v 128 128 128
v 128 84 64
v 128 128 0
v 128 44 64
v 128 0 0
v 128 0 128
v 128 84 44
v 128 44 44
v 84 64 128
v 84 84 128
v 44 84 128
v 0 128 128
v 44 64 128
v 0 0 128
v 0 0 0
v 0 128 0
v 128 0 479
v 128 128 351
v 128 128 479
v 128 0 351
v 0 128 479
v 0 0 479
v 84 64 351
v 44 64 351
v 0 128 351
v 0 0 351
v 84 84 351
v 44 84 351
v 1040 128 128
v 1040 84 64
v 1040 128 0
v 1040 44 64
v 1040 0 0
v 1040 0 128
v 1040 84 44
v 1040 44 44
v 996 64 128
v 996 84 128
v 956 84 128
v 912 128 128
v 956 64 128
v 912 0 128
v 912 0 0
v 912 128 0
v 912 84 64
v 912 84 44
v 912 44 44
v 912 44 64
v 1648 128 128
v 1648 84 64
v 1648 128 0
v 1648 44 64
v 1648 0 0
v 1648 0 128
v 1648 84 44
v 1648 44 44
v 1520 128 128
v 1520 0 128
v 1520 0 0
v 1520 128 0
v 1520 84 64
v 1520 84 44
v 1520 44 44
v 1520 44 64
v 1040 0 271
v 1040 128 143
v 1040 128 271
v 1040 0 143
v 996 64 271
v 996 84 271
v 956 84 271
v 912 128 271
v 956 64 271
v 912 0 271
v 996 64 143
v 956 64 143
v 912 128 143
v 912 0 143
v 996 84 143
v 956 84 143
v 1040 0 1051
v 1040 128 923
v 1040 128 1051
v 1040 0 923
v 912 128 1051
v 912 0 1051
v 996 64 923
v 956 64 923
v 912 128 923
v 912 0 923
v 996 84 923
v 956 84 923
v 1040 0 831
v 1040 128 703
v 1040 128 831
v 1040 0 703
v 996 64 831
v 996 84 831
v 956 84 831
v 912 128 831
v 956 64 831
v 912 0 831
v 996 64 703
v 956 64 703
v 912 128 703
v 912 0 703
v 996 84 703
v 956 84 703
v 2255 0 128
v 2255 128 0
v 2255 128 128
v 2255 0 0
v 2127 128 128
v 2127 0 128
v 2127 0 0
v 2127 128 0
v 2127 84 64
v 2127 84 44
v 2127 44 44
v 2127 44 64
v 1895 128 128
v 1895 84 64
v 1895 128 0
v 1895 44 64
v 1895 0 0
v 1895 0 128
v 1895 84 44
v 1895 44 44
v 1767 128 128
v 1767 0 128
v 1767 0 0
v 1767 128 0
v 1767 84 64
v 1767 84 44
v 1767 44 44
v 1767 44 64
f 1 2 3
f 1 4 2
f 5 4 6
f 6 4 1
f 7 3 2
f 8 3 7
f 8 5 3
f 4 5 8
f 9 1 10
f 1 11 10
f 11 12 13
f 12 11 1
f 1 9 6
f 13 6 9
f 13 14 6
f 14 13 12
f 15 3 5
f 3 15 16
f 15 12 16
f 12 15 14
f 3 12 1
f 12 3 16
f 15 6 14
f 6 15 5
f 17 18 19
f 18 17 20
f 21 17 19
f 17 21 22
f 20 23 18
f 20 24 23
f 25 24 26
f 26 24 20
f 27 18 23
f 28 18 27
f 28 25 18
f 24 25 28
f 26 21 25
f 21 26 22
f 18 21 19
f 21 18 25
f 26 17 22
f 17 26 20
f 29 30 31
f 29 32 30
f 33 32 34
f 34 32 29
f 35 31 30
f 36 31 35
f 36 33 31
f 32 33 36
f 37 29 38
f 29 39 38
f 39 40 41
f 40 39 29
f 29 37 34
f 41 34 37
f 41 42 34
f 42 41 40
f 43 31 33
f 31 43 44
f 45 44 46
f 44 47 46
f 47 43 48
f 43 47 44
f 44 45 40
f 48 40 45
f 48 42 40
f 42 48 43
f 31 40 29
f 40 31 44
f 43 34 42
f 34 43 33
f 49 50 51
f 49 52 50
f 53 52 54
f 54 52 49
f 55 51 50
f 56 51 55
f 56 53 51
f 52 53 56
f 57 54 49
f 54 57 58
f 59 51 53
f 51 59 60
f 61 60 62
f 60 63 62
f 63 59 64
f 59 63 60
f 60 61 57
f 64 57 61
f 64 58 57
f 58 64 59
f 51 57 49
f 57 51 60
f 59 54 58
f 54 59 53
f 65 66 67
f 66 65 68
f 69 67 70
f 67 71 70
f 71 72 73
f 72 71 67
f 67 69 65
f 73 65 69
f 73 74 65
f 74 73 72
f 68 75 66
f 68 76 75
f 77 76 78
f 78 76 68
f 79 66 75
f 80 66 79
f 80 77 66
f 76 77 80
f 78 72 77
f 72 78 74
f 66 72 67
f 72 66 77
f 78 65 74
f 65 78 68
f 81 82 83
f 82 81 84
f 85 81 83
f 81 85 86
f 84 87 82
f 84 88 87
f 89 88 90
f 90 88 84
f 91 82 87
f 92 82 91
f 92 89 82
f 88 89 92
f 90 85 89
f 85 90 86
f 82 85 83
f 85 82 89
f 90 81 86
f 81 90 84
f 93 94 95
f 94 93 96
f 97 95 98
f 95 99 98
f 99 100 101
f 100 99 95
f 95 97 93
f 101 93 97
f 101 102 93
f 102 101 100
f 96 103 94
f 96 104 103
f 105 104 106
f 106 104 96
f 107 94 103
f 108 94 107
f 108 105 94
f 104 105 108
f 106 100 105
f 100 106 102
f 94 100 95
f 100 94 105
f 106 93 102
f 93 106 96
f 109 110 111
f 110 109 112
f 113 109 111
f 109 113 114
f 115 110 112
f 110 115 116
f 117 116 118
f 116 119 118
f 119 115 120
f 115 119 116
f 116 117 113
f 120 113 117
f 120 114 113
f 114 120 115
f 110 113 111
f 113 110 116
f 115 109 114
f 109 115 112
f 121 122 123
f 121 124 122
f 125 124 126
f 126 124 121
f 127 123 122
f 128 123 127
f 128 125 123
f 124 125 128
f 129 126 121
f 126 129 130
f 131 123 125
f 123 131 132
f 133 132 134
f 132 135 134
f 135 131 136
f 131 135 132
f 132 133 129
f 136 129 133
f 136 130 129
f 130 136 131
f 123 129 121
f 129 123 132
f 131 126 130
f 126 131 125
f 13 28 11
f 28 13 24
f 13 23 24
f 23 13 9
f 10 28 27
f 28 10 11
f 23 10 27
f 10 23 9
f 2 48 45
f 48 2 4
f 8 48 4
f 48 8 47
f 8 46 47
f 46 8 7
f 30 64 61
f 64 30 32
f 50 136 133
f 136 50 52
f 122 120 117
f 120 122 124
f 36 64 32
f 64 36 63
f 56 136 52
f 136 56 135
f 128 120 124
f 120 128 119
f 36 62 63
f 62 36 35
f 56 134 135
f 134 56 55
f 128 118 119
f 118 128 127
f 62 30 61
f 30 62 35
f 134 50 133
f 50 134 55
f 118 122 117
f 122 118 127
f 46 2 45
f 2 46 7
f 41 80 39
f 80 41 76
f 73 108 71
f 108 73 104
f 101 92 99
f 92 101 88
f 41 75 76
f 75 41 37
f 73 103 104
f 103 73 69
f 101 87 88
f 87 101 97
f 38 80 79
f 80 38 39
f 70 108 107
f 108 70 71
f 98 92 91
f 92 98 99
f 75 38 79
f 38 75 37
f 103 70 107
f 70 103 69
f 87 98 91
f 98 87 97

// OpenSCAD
union() {
	%cube(size = [2560, 1600, 1000]);
	translate(v = [0.0, 0.0, 0.0]) {
		cube(size = [128, 128, 128]);
	}
	translate(v = [0.0, 0.0, 351.0]) {
		cube(size = [128, 128, 128]);
	}
	translate(v = [0.0, 0.0, 0.0]) {
		cube(size = [128, 128, 128]);
	}
	translate(v = [912.0, 0.0, 0.0]) {
		cube(size = [128, 128, 128]);
	}
	translate(v = [912.0, 0.0, 0.0]) {
		cube(size = [128, 128, 128]);
	}
	translate(v = [1520.0, 0.0, 0.0]) {
		cube(size = [128, 128, 128]);
	}
	translate(v = [912.0, 0.0, 0.0]) {
		cube(size = [128, 128, 128]);
	}
	translate(v = [912.0, 0.0, 0.0]) {
		cube(size = [128, 128, 128]);
	}
	translate(v = [0.0, 0.0, 0.0]) {
		cube(size = [128, 128, 128]);
	}
	translate(v = [0.0, 0.0, 0.0]) {
		cube(size = [128, 128, 128]);
	}
	translate(v = [912.0, 0.0, 0.0]) {
		cube(size = [128, 128, 128]);
	}
	translate(v = [912.0, 0.0, 0.0]) {
		cube(size = [128, 128, 128]);
	}
	translate(v = [912.0, 0.0, 143.0]) {
		cube(size = [128, 128, 128]);
	}
	translate(v = [912.0, 0.0, 0.0]) {
		cube(size = [128, 128, 128]);
	}
	translate(v = [912.0, 0.0, 923.0]) {
		cube(size = [128, 128, 128]);
	}
	translate(v = [912.0, 0.0, 0.0]) {
		cube(size = [128, 128, 128]);
	}
	translate(v = [912.0, 0.0, 703.0]) {
		cube(size = [128, 128, 128]);
	}
	translate(v = [912.0, 0.0, 0.0]) {
		cube(size = [128, 128, 128]);
	}
	translate(v = [912.0, 0.0, 0.0]) {
		cube(size = [128, 128, 128]);
	}
	translate(v = [912.0, 0.0, 0.0]) {
		cube(size = [128, 128, 128]);
	}
	translate(v = [2127.0, 0.0, 0.0]) {
		cube(size = [128, 128, 128]);
	}
	translate(v = [1767.0, 0.0, 0.0]) {
		cube(size = [128, 128, 128]);
	}
	translate(v = [912.0, 0.0, 0.0]) {
		cube(size = [128, 128, 128]);
	}
	translate(v = [912.0, 0.0, 0.0]) {
		cube(size = [128, 128, 128]);
	}
	translate(v = [912.0, 0.0, 0.0]) {
		cube(size = [128, 128, 128]);
	}
	translate(v = [912.0, 0.0, 0.0]) {
		cube(size = [128, 128, 128]);
	}
	translate(v = [912.0, 0.0, 0.0]) {
		cube(size = [128, 128, 128]);
	}
	translate(v = [912.0, 0.0, 0.0]) {
		cube(size = [128, 128, 128]);
	}
	translate(v = [912.0, 0.0, 0.0]) {
		cube(size = [128, 128, 128]);
	}
	translate(v = [912.0, 0.0, 0.0]) {
		cube(size = [128, 128, 128]);
	}
	translate(v = [0.0, 0.0, 0.0]) {
		cube(size = [128, 128, 128]);
	}
	translate(v = [0.0, 0.0, 0.0]) {
		cube(size = [128, 128, 128]);
	}
	translate(v = [64.0, 64.0, 415.0]) {
		rotate(a = [0, 180.0, 0.0]) {
			cube(size = [20, 20, 351.0]);
		}
	}
	translate(v = [64.0, 64.0, 64.0]) {
		rotate(a = [0, 0.0, 0.0]) {
			cube(size = [20, 20, 351.0]);
		}
	}
	translate(v = [976.0, 64.0, 64.0]) {
		rotate(a = [0, 90.0, 180.0]) {
			cube(size = [20, 20, 912.0]);
		}
	}
	translate(v = [976.0, 64.0, 64.0]) {
		rotate(a = [0, 90.0, 0.0]) {
			cube(size = [20, 20, 0.0]);
		}
	}
	translate(v = [1584.0, 64.0, 64.0]) {
		rotate(a = [0, 90.0, 180.0]) {
			cube(size = [20, 20, 608.0]);
		}
	}
	translate(v = [976.0, 64.0, 64.0]) {
		rotate(a = [0, 90.0, 0.0]) {
			cube(size = [20, 20, 608.0]);
		}
	}
	translate(v = [976.0, 64.0, 64.0]) {
		rotate(a = [0, 90.0, 0.0]) {
			cube(size = [20, 20, 0.0]);
		}
	}
	translate(v = [64.0, 64.0, 64.0]) {
		rotate(a = [0, 90.0, 0.0]) {
			cube(size = [20, 20, 912.0]);
		}
	}
	translate(v = [64.0, 64.0, 64.0]) {
		rotate(a = [0, 90.0, 0.0]) {
			cube(size = [20, 20, 0.0]);
		}
	}
	translate(v = [976.0, 64.0, 64.0]) {
		rotate(a = [0, 90.0, 180.0]) {
			cube(size = [20, 20, 912.0]);
		}
	}
	translate(v = [976.0, 64.0, 64.0]) {
		rotate(a = [0, 90.0, 0.0]) {
			cube(size = [20, 20, 0.0]);
		}
	}
	translate(v = [976.0, 64.0, 207.0]) {
		rotate(a = [0, 180.0, 0.0]) {
			cube(size = [20, 20, 143.0]);
		}
	}
	translate(v = [976.0, 64.0, 64.0]) {
		rotate(a = [0, 0.0, 0.0]) {
			cube(size = [20, 20, 143.0]);
		}
	}
	translate(v = [976.0, 64.0, 987.0]) {
		rotate(a = [0, 180.0, 0.0]) {
			cube(size = [20, 20, 923.0]);
		}
	}
	translate(v = [976.0, 64.0, 64.0]) {
		rotate(a = [0, 0.0, 0.0]) {
			cube(size = [20, 20, 923.0]);
		}
	}
	translate(v = [976.0, 64.0, 767.0]) {
		rotate(a = [0, 180.0, 0.0]) {
			cube(size = [20, 20, 703.0]);
		}
	}
	translate(v = [976.0, 64.0, 64.0]) {
		rotate(a = [0, 0.0, 0.0]) {
			cube(size = [20, 20, 703.0]);
		}
	}
	translate(v = [976.0, 64.0, 64.0]) {
		rotate(a = [0, 90.0, 0.0]) {
			cube(size = [20, 20, 0.0]);
		}
	}
	translate(v = [976.0, 64.0, 64.0]) {
		rotate(a = [0, 90.0, 0.0]) {
			cube(size = [20, 20, 0.0]);
		}
	}
	translate(v = [2191.0, 64.0, 64.0]) {
		rotate(a = [0, 90.0, 180.0]) {
			cube(size = [20, 20, 1215.0]);
		}
	}
	translate(v = [1831.0, 64.0, 64.0]) {
		rotate(a = [0, 90.0, 0.0]) {
			cube(size = [20, 20, 360.0]);
		}
	}
	translate(v = [976.0, 64.0, 64.0]) {
		rotate(a = [0, 90.0, 0.0]) {
			cube(size = [20, 20, 855.0]);
		}
	}
	translate(v = [976.0, 64.0, 64.0]) {
		rotate(a = [0, 90.0, 0.0]) {
			cube(size = [20, 20, 0.0]);
		}
	}
	translate(v = [976.0, 64.0, 64.0]) {
		rotate(a = [0, 90.0, 0.0]) {
			cube(size = [20, 20, 0.0]);
		}
	}
	translate(v = [976.0, 64.0, 64.0]) {
		rotate(a = [0, 90.0, 0.0]) {
			cube(size = [20, 20, 0.0]);
		}
	}
	translate(v = [976.0, 64.0, 64.0]) {
		rotate(a = [0, 90.0, 0.0]) {
			cube(size = [20, 20, 0.0]);
		}
	}
	translate(v = [976.0, 64.0, 64.0]) {
		rotate(a = [0, 90.0, 0.0]) {
			cube(size = [20, 20, 0.0]);
		}
	}
	translate(v = [976.0, 64.0, 64.0]) {
		rotate(a = [0, 90.0, 0.0]) {
			cube(size = [20, 20, 0.0]);
		}
	}
	translate(v = [976.0, 64.0, 64.0]) {
		rotate(a = [0, 90.0, 0.0]) {
			cube(size = [20, 20, 0.0]);
		}
	}
	translate(v = [64.0, 64.0, 64.0]) {
		rotate(a = [0, 90.0, 0.0]) {
			cube(size = [20, 20, 912.0]);
		}
	}
	translate(v = [64.0, 64.0, 64.0]) {
		rotate(a = [0, 90.0, 0.0]) {
			cube(size = [20, 20, 0.0]);
		}
	}
}
